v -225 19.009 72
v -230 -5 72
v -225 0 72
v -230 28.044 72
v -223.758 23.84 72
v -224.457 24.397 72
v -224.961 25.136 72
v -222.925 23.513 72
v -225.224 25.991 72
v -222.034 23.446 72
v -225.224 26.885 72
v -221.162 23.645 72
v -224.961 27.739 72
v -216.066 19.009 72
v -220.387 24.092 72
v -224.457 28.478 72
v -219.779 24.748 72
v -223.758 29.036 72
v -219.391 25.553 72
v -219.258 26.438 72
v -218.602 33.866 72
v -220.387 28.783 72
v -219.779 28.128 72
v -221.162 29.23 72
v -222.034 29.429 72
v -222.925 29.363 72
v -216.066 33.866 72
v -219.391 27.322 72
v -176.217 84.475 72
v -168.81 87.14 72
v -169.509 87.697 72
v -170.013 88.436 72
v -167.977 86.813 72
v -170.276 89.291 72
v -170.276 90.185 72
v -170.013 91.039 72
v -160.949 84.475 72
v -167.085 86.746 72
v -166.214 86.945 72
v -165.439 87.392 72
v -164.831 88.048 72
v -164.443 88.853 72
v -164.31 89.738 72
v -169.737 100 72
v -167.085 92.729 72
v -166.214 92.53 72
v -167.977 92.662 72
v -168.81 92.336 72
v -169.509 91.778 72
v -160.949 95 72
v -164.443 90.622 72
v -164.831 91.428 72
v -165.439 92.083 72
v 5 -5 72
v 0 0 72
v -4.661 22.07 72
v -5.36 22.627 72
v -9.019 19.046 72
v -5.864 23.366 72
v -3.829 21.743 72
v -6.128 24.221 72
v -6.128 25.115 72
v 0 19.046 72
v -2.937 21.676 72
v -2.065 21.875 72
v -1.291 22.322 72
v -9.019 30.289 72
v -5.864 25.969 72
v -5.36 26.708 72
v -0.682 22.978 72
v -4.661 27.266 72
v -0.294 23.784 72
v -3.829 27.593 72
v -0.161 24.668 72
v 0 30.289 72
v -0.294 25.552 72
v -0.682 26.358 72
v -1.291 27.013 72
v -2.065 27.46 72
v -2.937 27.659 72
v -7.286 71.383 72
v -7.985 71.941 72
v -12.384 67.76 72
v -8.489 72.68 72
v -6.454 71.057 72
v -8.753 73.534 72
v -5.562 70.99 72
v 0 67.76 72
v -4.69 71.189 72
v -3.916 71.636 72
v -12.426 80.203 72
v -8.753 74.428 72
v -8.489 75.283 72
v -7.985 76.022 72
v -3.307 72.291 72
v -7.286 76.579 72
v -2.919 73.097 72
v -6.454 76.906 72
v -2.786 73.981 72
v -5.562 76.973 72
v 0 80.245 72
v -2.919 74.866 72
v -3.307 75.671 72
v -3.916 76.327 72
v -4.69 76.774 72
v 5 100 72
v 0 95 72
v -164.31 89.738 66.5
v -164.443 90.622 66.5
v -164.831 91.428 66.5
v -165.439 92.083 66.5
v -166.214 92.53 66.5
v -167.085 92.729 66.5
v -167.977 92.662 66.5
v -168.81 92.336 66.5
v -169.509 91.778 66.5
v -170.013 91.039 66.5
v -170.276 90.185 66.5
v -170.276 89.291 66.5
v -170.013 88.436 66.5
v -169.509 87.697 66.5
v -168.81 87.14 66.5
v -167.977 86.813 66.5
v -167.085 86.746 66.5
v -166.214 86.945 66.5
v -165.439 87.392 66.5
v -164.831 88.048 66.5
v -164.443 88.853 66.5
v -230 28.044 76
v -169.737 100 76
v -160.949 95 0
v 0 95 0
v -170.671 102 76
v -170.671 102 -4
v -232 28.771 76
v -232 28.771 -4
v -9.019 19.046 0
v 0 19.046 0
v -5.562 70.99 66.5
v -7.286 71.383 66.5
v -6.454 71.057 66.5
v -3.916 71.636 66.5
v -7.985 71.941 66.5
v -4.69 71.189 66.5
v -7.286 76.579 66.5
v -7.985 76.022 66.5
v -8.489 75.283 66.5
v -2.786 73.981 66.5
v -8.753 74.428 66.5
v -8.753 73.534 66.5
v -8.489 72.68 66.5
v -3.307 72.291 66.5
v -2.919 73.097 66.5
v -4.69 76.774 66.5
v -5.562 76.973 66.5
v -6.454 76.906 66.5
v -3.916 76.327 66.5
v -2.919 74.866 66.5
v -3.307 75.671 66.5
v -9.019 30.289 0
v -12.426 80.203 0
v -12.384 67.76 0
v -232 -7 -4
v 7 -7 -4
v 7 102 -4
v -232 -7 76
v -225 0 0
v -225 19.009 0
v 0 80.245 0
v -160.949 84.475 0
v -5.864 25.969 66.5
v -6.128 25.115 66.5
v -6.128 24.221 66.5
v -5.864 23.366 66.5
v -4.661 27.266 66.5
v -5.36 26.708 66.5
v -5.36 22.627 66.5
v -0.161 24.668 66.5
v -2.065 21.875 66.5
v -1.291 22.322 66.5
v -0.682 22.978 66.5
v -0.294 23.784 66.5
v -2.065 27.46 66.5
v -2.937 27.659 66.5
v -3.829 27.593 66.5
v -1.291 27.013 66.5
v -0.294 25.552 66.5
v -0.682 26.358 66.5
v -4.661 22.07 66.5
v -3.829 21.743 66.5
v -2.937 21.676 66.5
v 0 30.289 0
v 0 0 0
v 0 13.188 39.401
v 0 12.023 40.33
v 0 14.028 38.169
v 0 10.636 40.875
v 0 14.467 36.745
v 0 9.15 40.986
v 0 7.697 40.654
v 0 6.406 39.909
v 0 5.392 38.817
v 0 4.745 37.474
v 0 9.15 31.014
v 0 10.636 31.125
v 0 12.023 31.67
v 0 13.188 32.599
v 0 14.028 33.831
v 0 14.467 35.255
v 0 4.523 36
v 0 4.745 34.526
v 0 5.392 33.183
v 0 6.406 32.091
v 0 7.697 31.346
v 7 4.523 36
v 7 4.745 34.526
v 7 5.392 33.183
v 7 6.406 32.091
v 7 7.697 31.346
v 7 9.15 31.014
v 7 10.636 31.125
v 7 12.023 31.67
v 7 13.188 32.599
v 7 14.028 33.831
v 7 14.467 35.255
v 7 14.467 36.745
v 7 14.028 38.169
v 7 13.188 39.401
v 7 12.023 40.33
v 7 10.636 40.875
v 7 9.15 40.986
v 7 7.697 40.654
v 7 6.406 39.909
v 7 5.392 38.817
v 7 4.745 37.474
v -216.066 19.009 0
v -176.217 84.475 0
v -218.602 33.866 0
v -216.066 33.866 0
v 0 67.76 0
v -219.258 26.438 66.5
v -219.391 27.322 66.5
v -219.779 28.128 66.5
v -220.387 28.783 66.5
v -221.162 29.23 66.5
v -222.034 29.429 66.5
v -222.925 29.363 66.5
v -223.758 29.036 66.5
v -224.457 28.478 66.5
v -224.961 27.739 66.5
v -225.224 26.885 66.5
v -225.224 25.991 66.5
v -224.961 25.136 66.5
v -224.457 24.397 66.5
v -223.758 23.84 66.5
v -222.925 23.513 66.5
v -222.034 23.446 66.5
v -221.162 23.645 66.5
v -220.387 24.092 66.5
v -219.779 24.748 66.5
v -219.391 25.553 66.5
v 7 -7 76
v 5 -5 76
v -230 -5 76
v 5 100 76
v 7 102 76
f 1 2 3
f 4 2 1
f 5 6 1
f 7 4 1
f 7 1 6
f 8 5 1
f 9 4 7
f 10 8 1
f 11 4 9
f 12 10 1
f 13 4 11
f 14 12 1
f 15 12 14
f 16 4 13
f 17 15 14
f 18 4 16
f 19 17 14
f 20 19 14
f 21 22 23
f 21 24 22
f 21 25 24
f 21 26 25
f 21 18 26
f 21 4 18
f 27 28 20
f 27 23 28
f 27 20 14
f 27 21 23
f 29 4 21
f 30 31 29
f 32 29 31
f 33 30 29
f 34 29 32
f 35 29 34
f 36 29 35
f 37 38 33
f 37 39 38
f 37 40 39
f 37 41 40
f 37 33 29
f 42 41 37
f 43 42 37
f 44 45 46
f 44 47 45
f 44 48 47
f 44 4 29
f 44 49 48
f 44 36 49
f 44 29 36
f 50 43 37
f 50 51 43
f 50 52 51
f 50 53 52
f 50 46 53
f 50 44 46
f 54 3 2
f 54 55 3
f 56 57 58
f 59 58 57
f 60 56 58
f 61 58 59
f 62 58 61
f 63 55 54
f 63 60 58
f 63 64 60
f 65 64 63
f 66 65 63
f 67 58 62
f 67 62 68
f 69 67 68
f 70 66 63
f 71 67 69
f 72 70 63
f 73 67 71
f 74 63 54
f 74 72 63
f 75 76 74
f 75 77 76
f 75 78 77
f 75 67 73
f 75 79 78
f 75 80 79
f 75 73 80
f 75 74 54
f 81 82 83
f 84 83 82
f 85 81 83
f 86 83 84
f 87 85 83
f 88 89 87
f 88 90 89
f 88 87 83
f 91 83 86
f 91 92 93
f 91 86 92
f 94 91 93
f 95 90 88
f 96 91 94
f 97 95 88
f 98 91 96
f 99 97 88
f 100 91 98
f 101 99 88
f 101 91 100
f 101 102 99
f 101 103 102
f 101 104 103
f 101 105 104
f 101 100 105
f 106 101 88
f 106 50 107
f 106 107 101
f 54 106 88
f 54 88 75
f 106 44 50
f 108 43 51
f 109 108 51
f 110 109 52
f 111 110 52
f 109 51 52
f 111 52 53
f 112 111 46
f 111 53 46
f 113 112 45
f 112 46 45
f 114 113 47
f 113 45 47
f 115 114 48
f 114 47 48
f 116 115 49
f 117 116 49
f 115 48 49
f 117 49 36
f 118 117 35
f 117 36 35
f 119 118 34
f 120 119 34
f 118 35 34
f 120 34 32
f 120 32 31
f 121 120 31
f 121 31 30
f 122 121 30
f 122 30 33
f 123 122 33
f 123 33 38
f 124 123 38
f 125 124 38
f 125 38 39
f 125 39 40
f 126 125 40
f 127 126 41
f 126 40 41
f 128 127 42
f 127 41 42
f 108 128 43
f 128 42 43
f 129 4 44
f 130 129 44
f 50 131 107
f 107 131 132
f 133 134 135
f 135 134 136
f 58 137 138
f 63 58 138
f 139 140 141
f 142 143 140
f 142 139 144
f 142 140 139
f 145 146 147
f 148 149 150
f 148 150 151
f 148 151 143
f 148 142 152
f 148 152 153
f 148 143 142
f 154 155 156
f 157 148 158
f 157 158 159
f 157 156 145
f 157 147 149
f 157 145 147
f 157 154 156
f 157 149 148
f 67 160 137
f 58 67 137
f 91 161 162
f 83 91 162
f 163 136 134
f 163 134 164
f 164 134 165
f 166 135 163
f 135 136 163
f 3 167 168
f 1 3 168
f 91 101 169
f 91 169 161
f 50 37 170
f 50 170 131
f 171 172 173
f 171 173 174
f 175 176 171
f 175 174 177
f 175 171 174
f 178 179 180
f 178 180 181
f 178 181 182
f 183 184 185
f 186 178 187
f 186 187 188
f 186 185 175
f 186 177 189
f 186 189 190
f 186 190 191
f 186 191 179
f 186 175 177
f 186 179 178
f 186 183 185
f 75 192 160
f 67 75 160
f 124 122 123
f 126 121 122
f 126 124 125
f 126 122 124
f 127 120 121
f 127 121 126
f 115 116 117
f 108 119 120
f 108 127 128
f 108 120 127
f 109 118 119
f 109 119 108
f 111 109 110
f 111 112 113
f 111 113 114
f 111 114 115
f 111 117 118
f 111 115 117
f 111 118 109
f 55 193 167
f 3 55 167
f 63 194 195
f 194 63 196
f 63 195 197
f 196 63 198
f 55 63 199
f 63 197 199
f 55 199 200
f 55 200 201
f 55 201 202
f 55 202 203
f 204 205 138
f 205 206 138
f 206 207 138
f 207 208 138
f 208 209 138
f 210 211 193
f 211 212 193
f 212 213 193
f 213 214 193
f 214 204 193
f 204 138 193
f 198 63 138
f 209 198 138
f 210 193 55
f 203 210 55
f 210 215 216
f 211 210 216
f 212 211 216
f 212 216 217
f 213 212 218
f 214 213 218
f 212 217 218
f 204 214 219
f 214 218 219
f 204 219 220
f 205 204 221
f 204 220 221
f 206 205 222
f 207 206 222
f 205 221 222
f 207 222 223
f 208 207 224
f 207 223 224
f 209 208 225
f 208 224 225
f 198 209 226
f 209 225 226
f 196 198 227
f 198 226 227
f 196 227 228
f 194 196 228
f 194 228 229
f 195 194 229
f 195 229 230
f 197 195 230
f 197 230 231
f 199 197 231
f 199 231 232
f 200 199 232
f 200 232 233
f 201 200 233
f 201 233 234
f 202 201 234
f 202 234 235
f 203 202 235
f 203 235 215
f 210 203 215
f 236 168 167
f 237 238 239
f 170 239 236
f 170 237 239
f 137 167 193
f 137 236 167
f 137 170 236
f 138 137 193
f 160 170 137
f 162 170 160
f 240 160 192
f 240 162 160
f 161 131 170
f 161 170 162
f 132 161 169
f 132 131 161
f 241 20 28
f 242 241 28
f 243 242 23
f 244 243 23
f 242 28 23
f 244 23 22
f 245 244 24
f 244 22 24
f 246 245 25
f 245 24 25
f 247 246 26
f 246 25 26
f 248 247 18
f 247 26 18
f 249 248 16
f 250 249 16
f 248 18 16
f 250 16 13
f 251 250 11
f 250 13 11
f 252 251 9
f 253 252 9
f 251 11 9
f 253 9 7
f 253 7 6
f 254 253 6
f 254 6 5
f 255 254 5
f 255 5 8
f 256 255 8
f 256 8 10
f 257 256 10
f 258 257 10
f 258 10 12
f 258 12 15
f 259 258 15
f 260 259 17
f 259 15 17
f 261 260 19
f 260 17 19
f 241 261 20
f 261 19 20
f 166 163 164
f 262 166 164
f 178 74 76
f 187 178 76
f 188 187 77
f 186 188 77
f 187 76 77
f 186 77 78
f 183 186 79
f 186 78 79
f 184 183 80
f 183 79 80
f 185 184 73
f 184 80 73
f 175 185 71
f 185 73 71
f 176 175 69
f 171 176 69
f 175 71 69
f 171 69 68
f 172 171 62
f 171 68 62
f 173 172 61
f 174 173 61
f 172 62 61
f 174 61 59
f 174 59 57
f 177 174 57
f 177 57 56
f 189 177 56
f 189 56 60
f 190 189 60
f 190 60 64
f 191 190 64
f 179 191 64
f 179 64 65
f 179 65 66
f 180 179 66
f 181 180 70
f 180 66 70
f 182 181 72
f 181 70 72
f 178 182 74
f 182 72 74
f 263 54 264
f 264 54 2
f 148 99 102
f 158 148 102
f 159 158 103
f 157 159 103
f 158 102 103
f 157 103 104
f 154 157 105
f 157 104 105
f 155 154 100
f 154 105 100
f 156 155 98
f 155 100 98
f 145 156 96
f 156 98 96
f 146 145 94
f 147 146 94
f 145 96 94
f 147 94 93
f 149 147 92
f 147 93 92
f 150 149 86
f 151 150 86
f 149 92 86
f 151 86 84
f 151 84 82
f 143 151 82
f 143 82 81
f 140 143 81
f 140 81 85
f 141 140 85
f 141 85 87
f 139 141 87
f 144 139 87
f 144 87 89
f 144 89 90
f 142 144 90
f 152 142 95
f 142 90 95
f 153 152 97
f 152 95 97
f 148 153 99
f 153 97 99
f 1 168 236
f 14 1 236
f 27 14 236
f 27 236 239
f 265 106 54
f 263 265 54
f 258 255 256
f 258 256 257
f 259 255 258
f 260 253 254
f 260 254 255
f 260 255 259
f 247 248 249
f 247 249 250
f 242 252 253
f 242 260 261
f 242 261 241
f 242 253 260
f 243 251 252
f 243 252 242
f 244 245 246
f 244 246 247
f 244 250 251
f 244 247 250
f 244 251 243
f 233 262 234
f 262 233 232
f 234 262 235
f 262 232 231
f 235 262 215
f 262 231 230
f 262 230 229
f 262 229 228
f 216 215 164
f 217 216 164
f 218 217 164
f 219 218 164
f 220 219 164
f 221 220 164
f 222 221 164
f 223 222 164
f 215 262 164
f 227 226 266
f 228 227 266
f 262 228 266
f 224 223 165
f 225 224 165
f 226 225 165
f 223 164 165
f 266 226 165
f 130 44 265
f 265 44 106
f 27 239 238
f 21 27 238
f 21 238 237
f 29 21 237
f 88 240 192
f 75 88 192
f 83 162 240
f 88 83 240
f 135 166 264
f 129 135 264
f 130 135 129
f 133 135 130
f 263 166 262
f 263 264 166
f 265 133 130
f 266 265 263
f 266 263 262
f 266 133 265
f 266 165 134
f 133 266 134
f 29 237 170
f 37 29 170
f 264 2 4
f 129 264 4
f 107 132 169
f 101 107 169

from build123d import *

# Parameters (mm, degrees)
F1_DEPTH = 72
F3_DEPTH = 4
F5_DEPTH = 4
F7_DEPTH = 25
F8_R     = 3
F9_DEPTH = 5.5


with BuildPart() as f1:
    # F0 (on Top) → F1 (new body)
    with BuildSketch(Plane.XY):
        Polygon((-232, 28.7712871801), (-232, 9), (-232, -7), (7, -7), (7, 102), (-170.6706311353, 102), align=None)
        Polygon((0, 9), (0, 0), (-11.2000130415, 0), (-29.7000130415, 0), (-48.2000130415, 0), (-66.7000130415, 0), (-85.2000130415, 0), (-103.7000130415, 0), (-122.2000130415, 0), (-140.7000130415, 0), (-159.2000130415, 0), (-177.7000130415, 0), (-196.2000130415, 0), (-214.7000130415, 0), (-225, 0), (-225, 9), (-225, 19.009443), (-216.0657793283, 19.009443), (-216.0657793283, 33.8660545808), (-218.6024326595, 33.8660545808), (-176.2169181556, 84.4753585209), (-160.9487113722, 84.4753585209), (-160.9487113722, 95), (0, 95), (0, 80.24520114), (-12.4263259421, 80.2028560212), (-12.3839236644, 67.7597565904), (0, 67.7597565904), (0, 30.28925322), (-9.0186540037, 30.28925322), (-9.0186540037, 19.0464295447), (0, 19.0464295447), align=None, mode=Mode.SUBTRACT)
    extrude(amount=F1_DEPTH)

    # F2 (on Top) → F3 (join)
    with BuildSketch(Plane.XY):
        Polygon((-170.6706311353, 102), (-232, 28.7712871801), (-232, -7), (7, -7), (7, 102), align=None)
    extrude(amount=-F3_DEPTH)

    # F4 (on face) → F5 (join)
    with BuildSketch(Plane.XY.offset(72)):
        Polygon((7, 102), (-170.6706311353, 102), (-232, 28.7712871801), (-232, -7), (7, -7), align=None)
        Polygon((-230, -5), (-230, 28.0444074988), (-169.7368749983, 100), (5, 100), (5, -5), align=None, mode=Mode.SUBTRACT)
    extrude(amount=F5_DEPTH)

    # F6 (on face) → F7 (cut)
    with BuildSketch(Plane.YZ.offset(7)):
        with BuildLine():
            Line((4.5232147723, 36), (14.5232147723, 36))
            ThreePointArc((14.5232147723, 36), (9.5232147723, 41), (4.5232147723, 36))
        make_face()
        with BuildLine():
            ThreePointArc((4.5232147723, 36), (9.5232147723, 31), (14.5232147723, 36))
            Line((14.5232147723, 36), (4.5232147723, 36))
        make_face()
    extrude(amount=-F7_DEPTH, mode=Mode.SUBTRACT)

    # F8 (on face) → F9 (cut)
    with BuildSketch(Plane.XY.offset(72)):
        with Locations((-167.3095971346, 89.7376792604)):
            Circle(F8_R)
        with Locations((-222.2577780485, 26.4377487904)):
            Circle(F8_R)
        with Locations((-5.7860915549, 73.9813063058)):
            Circle(F8_R)
        with Locations((-3.1610322185, 24.6678413823)):
            Circle(F8_R)
    extrude(amount=-F9_DEPTH, mode=Mode.SUBTRACT)


solid = f1.part
